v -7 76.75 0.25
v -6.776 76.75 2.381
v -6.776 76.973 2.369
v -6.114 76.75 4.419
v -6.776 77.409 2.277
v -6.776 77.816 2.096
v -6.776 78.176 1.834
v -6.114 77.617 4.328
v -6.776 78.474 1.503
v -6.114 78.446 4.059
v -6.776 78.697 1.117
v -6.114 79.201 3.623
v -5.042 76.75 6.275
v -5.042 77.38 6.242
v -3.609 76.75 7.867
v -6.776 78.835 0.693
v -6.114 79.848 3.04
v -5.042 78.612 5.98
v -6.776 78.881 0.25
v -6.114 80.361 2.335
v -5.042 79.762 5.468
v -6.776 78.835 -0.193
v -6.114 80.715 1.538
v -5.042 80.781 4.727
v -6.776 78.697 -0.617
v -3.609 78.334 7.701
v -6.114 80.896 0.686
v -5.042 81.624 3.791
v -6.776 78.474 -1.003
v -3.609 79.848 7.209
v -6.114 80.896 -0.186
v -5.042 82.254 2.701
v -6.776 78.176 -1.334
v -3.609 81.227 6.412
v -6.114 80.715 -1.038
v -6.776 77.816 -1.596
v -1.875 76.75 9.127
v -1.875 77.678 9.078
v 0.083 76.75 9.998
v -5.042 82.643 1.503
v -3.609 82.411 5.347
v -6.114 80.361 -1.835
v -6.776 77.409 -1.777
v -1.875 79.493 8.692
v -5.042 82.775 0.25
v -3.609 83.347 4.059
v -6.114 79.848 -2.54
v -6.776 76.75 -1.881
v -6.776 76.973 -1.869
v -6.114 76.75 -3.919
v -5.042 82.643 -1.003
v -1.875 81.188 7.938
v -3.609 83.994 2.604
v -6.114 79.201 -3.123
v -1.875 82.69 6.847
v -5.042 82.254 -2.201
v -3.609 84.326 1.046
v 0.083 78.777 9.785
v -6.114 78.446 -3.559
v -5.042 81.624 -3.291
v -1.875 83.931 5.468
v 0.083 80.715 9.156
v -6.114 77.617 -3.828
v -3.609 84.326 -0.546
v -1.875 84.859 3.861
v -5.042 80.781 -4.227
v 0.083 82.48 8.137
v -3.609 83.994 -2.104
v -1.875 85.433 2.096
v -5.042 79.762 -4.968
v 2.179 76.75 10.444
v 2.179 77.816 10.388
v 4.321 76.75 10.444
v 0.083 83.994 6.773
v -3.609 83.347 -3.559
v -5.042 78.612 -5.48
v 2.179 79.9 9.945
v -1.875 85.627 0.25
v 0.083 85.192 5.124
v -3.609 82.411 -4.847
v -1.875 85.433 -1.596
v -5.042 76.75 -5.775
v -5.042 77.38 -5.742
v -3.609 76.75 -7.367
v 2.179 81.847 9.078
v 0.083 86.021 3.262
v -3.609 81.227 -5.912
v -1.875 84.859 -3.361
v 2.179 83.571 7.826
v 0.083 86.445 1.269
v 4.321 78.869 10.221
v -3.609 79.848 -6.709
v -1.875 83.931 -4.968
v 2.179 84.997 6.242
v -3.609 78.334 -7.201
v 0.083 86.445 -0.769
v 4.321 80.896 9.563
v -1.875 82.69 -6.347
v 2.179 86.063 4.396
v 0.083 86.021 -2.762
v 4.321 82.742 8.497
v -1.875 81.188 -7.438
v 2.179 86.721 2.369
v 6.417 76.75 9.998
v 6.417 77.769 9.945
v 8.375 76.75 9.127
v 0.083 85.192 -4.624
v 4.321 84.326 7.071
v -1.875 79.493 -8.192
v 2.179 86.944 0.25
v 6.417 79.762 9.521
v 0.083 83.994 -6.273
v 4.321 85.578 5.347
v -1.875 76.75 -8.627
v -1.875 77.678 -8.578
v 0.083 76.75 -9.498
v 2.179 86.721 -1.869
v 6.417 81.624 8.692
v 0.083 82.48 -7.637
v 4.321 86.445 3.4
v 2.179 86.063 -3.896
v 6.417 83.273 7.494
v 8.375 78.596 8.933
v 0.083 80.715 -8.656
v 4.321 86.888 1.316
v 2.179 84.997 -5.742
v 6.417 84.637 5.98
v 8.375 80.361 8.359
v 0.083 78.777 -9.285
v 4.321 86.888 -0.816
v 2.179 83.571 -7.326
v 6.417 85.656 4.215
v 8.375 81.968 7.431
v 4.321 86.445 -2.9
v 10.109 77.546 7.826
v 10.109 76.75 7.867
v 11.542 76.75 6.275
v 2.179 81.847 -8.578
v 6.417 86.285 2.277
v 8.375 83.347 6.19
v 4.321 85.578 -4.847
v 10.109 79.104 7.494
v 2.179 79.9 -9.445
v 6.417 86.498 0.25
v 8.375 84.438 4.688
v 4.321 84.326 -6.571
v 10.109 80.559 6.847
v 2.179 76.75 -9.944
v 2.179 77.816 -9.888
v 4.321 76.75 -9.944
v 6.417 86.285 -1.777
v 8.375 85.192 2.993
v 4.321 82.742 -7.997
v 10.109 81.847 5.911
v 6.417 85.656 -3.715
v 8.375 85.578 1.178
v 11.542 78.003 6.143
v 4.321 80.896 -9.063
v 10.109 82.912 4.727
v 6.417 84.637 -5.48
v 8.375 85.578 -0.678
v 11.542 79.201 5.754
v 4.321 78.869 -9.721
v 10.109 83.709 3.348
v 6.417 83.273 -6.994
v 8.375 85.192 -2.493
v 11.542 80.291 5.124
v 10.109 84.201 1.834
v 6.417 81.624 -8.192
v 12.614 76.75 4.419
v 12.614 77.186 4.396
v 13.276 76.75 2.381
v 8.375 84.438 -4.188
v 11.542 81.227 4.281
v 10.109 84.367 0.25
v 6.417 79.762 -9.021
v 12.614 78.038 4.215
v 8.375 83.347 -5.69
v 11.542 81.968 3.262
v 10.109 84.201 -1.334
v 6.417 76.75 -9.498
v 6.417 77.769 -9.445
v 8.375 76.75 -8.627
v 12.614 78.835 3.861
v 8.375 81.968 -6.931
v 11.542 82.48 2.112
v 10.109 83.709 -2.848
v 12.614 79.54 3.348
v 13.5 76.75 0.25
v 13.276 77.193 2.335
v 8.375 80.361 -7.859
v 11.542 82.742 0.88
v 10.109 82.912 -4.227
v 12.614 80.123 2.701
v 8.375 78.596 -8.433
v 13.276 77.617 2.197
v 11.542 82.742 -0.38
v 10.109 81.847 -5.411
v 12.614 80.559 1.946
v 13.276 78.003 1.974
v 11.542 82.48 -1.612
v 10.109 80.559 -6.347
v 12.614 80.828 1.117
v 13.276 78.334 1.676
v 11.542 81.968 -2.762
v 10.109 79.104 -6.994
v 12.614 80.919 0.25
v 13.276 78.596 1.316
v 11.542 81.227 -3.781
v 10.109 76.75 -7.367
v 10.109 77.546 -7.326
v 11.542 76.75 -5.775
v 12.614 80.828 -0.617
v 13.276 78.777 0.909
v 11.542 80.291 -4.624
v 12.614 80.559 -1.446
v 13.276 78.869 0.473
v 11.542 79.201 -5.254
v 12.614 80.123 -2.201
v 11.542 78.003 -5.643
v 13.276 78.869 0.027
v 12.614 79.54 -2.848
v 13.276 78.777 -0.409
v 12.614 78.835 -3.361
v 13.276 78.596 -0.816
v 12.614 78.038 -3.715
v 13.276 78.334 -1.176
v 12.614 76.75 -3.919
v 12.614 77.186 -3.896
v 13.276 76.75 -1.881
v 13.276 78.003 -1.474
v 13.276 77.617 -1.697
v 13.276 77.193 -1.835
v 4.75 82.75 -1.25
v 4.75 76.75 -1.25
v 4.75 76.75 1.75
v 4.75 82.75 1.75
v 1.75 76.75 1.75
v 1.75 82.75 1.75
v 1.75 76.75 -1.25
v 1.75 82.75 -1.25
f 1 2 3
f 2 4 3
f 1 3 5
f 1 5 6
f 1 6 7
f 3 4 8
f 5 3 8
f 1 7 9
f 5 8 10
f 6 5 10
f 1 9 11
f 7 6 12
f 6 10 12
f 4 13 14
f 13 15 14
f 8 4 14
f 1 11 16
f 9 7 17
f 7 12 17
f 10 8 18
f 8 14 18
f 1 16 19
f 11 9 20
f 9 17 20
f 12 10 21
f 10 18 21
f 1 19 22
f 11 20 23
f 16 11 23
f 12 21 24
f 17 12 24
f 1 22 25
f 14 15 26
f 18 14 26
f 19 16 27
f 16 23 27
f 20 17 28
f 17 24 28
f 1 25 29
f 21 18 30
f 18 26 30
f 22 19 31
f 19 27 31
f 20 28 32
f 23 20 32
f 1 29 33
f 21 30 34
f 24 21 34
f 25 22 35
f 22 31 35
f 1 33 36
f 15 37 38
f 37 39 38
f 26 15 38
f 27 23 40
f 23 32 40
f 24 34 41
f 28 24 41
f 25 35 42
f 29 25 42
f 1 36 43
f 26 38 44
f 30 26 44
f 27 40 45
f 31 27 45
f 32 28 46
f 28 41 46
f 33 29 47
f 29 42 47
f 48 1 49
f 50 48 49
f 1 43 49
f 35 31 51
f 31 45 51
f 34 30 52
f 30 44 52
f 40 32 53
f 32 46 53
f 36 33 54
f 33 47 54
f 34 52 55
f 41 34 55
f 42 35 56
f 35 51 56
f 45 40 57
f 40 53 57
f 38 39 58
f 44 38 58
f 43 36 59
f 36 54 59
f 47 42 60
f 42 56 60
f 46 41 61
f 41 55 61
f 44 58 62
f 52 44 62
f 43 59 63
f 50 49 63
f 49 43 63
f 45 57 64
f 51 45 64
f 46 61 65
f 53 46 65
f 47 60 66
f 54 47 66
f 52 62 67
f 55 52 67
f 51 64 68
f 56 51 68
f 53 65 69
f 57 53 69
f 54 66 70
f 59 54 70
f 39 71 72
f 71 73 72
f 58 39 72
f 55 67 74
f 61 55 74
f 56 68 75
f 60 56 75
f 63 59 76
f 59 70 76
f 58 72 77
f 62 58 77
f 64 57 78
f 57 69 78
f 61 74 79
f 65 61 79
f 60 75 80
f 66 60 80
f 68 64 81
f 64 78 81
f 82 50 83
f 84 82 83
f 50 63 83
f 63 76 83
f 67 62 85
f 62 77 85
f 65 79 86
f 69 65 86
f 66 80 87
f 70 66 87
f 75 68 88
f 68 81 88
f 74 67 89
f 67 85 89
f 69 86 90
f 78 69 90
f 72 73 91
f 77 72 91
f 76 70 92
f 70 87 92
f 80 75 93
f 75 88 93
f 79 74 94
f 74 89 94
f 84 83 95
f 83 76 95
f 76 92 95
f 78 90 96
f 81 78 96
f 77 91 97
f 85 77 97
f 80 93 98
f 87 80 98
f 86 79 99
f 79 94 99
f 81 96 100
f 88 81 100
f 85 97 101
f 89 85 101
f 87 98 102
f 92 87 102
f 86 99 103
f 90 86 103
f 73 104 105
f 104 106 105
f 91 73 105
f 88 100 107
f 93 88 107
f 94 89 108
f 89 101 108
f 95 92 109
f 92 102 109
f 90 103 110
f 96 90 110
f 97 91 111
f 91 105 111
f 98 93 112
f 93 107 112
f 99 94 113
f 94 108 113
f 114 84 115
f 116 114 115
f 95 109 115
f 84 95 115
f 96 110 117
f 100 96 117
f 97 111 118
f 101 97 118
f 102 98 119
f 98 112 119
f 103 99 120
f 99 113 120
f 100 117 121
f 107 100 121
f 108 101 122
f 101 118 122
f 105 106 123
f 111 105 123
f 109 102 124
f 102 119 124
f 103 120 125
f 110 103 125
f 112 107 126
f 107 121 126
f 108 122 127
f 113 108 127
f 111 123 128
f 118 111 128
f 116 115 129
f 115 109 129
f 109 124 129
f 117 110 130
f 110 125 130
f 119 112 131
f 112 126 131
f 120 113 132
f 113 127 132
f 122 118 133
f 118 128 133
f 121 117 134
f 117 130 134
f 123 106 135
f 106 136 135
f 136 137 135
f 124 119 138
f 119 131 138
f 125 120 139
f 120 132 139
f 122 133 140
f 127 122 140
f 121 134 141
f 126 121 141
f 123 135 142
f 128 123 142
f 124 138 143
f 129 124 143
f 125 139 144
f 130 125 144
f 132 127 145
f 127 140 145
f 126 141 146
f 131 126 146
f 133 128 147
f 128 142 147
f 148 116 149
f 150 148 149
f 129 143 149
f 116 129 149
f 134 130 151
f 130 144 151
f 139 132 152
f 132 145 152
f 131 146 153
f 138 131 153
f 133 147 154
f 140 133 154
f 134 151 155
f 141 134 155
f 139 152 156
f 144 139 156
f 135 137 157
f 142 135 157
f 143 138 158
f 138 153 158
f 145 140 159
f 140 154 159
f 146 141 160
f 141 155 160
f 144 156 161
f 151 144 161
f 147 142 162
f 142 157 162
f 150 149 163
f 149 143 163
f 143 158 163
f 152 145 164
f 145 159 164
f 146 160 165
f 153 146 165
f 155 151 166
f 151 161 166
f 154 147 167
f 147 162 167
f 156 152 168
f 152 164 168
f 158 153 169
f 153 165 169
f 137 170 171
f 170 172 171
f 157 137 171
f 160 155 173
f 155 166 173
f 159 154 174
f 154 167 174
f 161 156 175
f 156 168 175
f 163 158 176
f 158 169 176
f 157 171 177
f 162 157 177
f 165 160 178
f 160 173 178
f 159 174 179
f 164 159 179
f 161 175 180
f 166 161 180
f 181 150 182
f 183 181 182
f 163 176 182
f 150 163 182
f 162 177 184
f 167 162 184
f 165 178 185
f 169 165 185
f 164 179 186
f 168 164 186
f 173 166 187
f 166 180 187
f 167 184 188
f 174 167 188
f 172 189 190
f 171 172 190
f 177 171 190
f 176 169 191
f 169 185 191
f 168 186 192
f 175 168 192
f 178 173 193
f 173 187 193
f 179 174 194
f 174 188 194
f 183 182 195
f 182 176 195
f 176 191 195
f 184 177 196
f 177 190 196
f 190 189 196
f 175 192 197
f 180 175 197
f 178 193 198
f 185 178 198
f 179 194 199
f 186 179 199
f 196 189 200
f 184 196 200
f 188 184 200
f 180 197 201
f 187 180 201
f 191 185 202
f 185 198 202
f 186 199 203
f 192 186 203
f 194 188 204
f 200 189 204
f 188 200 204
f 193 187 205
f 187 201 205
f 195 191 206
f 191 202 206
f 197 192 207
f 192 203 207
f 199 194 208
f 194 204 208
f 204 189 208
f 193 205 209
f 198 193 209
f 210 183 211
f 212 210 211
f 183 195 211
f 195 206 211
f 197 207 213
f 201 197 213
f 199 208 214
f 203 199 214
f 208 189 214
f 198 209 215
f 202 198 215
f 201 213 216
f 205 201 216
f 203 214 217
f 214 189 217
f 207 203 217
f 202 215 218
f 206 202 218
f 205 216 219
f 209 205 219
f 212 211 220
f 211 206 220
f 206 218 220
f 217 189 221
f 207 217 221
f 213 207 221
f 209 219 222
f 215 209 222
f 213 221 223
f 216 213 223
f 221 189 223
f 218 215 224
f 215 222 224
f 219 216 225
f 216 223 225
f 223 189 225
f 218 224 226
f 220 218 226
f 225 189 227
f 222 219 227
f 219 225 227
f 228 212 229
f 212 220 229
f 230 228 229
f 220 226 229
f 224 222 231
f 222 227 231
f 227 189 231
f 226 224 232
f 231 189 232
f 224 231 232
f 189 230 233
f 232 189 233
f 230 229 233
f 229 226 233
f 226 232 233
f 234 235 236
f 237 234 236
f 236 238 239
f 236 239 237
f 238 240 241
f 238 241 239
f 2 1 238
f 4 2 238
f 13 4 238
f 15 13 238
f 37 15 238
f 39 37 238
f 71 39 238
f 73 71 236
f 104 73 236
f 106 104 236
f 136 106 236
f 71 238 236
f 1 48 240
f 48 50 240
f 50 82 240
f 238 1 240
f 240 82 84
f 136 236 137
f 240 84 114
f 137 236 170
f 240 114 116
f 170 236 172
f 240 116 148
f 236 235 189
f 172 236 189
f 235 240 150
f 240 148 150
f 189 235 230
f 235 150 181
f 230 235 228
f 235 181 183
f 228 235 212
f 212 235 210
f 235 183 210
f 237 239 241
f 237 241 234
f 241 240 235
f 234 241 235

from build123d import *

# Parameters (mm, degrees)
REVOLVE1_ANGLE     = 180
SKETCH2_W          = 3
SKETCH2_H          = 3
CUT_EXTRUDE1_DEPTH = 6


with BuildPart() as part:
    # Sketch1 → Revolve1 (revolve)
    with BuildSketch(Plane(origin=(0, 76.75, 0), x_dir=(-1, 0, 0), z_dir=(0, -1, 0))):
        with BuildLine():
            Line((-13.5, -0.25), (7, -0.25))
            ThreePointArc((7, -0.25), (-3.25, -10.5), (-13.5, -0.25))
        make_face()
    revolve(axis=Axis((13.5, 76.75, 0.25), (-1, 0, 0)), revolution_arc=REVOLVE1_ANGLE)

    # Sketch2 → Cut-Extrude1 (cut)
    with BuildSketch(Plane.XZ.offset(-76.75)):
        with Locations((3.25, 0.25)):
            Rectangle(SKETCH2_W, SKETCH2_H)
    extrude(amount=-CUT_EXTRUDE1_DEPTH, mode=Mode.SUBTRACT)


solid = part.part
